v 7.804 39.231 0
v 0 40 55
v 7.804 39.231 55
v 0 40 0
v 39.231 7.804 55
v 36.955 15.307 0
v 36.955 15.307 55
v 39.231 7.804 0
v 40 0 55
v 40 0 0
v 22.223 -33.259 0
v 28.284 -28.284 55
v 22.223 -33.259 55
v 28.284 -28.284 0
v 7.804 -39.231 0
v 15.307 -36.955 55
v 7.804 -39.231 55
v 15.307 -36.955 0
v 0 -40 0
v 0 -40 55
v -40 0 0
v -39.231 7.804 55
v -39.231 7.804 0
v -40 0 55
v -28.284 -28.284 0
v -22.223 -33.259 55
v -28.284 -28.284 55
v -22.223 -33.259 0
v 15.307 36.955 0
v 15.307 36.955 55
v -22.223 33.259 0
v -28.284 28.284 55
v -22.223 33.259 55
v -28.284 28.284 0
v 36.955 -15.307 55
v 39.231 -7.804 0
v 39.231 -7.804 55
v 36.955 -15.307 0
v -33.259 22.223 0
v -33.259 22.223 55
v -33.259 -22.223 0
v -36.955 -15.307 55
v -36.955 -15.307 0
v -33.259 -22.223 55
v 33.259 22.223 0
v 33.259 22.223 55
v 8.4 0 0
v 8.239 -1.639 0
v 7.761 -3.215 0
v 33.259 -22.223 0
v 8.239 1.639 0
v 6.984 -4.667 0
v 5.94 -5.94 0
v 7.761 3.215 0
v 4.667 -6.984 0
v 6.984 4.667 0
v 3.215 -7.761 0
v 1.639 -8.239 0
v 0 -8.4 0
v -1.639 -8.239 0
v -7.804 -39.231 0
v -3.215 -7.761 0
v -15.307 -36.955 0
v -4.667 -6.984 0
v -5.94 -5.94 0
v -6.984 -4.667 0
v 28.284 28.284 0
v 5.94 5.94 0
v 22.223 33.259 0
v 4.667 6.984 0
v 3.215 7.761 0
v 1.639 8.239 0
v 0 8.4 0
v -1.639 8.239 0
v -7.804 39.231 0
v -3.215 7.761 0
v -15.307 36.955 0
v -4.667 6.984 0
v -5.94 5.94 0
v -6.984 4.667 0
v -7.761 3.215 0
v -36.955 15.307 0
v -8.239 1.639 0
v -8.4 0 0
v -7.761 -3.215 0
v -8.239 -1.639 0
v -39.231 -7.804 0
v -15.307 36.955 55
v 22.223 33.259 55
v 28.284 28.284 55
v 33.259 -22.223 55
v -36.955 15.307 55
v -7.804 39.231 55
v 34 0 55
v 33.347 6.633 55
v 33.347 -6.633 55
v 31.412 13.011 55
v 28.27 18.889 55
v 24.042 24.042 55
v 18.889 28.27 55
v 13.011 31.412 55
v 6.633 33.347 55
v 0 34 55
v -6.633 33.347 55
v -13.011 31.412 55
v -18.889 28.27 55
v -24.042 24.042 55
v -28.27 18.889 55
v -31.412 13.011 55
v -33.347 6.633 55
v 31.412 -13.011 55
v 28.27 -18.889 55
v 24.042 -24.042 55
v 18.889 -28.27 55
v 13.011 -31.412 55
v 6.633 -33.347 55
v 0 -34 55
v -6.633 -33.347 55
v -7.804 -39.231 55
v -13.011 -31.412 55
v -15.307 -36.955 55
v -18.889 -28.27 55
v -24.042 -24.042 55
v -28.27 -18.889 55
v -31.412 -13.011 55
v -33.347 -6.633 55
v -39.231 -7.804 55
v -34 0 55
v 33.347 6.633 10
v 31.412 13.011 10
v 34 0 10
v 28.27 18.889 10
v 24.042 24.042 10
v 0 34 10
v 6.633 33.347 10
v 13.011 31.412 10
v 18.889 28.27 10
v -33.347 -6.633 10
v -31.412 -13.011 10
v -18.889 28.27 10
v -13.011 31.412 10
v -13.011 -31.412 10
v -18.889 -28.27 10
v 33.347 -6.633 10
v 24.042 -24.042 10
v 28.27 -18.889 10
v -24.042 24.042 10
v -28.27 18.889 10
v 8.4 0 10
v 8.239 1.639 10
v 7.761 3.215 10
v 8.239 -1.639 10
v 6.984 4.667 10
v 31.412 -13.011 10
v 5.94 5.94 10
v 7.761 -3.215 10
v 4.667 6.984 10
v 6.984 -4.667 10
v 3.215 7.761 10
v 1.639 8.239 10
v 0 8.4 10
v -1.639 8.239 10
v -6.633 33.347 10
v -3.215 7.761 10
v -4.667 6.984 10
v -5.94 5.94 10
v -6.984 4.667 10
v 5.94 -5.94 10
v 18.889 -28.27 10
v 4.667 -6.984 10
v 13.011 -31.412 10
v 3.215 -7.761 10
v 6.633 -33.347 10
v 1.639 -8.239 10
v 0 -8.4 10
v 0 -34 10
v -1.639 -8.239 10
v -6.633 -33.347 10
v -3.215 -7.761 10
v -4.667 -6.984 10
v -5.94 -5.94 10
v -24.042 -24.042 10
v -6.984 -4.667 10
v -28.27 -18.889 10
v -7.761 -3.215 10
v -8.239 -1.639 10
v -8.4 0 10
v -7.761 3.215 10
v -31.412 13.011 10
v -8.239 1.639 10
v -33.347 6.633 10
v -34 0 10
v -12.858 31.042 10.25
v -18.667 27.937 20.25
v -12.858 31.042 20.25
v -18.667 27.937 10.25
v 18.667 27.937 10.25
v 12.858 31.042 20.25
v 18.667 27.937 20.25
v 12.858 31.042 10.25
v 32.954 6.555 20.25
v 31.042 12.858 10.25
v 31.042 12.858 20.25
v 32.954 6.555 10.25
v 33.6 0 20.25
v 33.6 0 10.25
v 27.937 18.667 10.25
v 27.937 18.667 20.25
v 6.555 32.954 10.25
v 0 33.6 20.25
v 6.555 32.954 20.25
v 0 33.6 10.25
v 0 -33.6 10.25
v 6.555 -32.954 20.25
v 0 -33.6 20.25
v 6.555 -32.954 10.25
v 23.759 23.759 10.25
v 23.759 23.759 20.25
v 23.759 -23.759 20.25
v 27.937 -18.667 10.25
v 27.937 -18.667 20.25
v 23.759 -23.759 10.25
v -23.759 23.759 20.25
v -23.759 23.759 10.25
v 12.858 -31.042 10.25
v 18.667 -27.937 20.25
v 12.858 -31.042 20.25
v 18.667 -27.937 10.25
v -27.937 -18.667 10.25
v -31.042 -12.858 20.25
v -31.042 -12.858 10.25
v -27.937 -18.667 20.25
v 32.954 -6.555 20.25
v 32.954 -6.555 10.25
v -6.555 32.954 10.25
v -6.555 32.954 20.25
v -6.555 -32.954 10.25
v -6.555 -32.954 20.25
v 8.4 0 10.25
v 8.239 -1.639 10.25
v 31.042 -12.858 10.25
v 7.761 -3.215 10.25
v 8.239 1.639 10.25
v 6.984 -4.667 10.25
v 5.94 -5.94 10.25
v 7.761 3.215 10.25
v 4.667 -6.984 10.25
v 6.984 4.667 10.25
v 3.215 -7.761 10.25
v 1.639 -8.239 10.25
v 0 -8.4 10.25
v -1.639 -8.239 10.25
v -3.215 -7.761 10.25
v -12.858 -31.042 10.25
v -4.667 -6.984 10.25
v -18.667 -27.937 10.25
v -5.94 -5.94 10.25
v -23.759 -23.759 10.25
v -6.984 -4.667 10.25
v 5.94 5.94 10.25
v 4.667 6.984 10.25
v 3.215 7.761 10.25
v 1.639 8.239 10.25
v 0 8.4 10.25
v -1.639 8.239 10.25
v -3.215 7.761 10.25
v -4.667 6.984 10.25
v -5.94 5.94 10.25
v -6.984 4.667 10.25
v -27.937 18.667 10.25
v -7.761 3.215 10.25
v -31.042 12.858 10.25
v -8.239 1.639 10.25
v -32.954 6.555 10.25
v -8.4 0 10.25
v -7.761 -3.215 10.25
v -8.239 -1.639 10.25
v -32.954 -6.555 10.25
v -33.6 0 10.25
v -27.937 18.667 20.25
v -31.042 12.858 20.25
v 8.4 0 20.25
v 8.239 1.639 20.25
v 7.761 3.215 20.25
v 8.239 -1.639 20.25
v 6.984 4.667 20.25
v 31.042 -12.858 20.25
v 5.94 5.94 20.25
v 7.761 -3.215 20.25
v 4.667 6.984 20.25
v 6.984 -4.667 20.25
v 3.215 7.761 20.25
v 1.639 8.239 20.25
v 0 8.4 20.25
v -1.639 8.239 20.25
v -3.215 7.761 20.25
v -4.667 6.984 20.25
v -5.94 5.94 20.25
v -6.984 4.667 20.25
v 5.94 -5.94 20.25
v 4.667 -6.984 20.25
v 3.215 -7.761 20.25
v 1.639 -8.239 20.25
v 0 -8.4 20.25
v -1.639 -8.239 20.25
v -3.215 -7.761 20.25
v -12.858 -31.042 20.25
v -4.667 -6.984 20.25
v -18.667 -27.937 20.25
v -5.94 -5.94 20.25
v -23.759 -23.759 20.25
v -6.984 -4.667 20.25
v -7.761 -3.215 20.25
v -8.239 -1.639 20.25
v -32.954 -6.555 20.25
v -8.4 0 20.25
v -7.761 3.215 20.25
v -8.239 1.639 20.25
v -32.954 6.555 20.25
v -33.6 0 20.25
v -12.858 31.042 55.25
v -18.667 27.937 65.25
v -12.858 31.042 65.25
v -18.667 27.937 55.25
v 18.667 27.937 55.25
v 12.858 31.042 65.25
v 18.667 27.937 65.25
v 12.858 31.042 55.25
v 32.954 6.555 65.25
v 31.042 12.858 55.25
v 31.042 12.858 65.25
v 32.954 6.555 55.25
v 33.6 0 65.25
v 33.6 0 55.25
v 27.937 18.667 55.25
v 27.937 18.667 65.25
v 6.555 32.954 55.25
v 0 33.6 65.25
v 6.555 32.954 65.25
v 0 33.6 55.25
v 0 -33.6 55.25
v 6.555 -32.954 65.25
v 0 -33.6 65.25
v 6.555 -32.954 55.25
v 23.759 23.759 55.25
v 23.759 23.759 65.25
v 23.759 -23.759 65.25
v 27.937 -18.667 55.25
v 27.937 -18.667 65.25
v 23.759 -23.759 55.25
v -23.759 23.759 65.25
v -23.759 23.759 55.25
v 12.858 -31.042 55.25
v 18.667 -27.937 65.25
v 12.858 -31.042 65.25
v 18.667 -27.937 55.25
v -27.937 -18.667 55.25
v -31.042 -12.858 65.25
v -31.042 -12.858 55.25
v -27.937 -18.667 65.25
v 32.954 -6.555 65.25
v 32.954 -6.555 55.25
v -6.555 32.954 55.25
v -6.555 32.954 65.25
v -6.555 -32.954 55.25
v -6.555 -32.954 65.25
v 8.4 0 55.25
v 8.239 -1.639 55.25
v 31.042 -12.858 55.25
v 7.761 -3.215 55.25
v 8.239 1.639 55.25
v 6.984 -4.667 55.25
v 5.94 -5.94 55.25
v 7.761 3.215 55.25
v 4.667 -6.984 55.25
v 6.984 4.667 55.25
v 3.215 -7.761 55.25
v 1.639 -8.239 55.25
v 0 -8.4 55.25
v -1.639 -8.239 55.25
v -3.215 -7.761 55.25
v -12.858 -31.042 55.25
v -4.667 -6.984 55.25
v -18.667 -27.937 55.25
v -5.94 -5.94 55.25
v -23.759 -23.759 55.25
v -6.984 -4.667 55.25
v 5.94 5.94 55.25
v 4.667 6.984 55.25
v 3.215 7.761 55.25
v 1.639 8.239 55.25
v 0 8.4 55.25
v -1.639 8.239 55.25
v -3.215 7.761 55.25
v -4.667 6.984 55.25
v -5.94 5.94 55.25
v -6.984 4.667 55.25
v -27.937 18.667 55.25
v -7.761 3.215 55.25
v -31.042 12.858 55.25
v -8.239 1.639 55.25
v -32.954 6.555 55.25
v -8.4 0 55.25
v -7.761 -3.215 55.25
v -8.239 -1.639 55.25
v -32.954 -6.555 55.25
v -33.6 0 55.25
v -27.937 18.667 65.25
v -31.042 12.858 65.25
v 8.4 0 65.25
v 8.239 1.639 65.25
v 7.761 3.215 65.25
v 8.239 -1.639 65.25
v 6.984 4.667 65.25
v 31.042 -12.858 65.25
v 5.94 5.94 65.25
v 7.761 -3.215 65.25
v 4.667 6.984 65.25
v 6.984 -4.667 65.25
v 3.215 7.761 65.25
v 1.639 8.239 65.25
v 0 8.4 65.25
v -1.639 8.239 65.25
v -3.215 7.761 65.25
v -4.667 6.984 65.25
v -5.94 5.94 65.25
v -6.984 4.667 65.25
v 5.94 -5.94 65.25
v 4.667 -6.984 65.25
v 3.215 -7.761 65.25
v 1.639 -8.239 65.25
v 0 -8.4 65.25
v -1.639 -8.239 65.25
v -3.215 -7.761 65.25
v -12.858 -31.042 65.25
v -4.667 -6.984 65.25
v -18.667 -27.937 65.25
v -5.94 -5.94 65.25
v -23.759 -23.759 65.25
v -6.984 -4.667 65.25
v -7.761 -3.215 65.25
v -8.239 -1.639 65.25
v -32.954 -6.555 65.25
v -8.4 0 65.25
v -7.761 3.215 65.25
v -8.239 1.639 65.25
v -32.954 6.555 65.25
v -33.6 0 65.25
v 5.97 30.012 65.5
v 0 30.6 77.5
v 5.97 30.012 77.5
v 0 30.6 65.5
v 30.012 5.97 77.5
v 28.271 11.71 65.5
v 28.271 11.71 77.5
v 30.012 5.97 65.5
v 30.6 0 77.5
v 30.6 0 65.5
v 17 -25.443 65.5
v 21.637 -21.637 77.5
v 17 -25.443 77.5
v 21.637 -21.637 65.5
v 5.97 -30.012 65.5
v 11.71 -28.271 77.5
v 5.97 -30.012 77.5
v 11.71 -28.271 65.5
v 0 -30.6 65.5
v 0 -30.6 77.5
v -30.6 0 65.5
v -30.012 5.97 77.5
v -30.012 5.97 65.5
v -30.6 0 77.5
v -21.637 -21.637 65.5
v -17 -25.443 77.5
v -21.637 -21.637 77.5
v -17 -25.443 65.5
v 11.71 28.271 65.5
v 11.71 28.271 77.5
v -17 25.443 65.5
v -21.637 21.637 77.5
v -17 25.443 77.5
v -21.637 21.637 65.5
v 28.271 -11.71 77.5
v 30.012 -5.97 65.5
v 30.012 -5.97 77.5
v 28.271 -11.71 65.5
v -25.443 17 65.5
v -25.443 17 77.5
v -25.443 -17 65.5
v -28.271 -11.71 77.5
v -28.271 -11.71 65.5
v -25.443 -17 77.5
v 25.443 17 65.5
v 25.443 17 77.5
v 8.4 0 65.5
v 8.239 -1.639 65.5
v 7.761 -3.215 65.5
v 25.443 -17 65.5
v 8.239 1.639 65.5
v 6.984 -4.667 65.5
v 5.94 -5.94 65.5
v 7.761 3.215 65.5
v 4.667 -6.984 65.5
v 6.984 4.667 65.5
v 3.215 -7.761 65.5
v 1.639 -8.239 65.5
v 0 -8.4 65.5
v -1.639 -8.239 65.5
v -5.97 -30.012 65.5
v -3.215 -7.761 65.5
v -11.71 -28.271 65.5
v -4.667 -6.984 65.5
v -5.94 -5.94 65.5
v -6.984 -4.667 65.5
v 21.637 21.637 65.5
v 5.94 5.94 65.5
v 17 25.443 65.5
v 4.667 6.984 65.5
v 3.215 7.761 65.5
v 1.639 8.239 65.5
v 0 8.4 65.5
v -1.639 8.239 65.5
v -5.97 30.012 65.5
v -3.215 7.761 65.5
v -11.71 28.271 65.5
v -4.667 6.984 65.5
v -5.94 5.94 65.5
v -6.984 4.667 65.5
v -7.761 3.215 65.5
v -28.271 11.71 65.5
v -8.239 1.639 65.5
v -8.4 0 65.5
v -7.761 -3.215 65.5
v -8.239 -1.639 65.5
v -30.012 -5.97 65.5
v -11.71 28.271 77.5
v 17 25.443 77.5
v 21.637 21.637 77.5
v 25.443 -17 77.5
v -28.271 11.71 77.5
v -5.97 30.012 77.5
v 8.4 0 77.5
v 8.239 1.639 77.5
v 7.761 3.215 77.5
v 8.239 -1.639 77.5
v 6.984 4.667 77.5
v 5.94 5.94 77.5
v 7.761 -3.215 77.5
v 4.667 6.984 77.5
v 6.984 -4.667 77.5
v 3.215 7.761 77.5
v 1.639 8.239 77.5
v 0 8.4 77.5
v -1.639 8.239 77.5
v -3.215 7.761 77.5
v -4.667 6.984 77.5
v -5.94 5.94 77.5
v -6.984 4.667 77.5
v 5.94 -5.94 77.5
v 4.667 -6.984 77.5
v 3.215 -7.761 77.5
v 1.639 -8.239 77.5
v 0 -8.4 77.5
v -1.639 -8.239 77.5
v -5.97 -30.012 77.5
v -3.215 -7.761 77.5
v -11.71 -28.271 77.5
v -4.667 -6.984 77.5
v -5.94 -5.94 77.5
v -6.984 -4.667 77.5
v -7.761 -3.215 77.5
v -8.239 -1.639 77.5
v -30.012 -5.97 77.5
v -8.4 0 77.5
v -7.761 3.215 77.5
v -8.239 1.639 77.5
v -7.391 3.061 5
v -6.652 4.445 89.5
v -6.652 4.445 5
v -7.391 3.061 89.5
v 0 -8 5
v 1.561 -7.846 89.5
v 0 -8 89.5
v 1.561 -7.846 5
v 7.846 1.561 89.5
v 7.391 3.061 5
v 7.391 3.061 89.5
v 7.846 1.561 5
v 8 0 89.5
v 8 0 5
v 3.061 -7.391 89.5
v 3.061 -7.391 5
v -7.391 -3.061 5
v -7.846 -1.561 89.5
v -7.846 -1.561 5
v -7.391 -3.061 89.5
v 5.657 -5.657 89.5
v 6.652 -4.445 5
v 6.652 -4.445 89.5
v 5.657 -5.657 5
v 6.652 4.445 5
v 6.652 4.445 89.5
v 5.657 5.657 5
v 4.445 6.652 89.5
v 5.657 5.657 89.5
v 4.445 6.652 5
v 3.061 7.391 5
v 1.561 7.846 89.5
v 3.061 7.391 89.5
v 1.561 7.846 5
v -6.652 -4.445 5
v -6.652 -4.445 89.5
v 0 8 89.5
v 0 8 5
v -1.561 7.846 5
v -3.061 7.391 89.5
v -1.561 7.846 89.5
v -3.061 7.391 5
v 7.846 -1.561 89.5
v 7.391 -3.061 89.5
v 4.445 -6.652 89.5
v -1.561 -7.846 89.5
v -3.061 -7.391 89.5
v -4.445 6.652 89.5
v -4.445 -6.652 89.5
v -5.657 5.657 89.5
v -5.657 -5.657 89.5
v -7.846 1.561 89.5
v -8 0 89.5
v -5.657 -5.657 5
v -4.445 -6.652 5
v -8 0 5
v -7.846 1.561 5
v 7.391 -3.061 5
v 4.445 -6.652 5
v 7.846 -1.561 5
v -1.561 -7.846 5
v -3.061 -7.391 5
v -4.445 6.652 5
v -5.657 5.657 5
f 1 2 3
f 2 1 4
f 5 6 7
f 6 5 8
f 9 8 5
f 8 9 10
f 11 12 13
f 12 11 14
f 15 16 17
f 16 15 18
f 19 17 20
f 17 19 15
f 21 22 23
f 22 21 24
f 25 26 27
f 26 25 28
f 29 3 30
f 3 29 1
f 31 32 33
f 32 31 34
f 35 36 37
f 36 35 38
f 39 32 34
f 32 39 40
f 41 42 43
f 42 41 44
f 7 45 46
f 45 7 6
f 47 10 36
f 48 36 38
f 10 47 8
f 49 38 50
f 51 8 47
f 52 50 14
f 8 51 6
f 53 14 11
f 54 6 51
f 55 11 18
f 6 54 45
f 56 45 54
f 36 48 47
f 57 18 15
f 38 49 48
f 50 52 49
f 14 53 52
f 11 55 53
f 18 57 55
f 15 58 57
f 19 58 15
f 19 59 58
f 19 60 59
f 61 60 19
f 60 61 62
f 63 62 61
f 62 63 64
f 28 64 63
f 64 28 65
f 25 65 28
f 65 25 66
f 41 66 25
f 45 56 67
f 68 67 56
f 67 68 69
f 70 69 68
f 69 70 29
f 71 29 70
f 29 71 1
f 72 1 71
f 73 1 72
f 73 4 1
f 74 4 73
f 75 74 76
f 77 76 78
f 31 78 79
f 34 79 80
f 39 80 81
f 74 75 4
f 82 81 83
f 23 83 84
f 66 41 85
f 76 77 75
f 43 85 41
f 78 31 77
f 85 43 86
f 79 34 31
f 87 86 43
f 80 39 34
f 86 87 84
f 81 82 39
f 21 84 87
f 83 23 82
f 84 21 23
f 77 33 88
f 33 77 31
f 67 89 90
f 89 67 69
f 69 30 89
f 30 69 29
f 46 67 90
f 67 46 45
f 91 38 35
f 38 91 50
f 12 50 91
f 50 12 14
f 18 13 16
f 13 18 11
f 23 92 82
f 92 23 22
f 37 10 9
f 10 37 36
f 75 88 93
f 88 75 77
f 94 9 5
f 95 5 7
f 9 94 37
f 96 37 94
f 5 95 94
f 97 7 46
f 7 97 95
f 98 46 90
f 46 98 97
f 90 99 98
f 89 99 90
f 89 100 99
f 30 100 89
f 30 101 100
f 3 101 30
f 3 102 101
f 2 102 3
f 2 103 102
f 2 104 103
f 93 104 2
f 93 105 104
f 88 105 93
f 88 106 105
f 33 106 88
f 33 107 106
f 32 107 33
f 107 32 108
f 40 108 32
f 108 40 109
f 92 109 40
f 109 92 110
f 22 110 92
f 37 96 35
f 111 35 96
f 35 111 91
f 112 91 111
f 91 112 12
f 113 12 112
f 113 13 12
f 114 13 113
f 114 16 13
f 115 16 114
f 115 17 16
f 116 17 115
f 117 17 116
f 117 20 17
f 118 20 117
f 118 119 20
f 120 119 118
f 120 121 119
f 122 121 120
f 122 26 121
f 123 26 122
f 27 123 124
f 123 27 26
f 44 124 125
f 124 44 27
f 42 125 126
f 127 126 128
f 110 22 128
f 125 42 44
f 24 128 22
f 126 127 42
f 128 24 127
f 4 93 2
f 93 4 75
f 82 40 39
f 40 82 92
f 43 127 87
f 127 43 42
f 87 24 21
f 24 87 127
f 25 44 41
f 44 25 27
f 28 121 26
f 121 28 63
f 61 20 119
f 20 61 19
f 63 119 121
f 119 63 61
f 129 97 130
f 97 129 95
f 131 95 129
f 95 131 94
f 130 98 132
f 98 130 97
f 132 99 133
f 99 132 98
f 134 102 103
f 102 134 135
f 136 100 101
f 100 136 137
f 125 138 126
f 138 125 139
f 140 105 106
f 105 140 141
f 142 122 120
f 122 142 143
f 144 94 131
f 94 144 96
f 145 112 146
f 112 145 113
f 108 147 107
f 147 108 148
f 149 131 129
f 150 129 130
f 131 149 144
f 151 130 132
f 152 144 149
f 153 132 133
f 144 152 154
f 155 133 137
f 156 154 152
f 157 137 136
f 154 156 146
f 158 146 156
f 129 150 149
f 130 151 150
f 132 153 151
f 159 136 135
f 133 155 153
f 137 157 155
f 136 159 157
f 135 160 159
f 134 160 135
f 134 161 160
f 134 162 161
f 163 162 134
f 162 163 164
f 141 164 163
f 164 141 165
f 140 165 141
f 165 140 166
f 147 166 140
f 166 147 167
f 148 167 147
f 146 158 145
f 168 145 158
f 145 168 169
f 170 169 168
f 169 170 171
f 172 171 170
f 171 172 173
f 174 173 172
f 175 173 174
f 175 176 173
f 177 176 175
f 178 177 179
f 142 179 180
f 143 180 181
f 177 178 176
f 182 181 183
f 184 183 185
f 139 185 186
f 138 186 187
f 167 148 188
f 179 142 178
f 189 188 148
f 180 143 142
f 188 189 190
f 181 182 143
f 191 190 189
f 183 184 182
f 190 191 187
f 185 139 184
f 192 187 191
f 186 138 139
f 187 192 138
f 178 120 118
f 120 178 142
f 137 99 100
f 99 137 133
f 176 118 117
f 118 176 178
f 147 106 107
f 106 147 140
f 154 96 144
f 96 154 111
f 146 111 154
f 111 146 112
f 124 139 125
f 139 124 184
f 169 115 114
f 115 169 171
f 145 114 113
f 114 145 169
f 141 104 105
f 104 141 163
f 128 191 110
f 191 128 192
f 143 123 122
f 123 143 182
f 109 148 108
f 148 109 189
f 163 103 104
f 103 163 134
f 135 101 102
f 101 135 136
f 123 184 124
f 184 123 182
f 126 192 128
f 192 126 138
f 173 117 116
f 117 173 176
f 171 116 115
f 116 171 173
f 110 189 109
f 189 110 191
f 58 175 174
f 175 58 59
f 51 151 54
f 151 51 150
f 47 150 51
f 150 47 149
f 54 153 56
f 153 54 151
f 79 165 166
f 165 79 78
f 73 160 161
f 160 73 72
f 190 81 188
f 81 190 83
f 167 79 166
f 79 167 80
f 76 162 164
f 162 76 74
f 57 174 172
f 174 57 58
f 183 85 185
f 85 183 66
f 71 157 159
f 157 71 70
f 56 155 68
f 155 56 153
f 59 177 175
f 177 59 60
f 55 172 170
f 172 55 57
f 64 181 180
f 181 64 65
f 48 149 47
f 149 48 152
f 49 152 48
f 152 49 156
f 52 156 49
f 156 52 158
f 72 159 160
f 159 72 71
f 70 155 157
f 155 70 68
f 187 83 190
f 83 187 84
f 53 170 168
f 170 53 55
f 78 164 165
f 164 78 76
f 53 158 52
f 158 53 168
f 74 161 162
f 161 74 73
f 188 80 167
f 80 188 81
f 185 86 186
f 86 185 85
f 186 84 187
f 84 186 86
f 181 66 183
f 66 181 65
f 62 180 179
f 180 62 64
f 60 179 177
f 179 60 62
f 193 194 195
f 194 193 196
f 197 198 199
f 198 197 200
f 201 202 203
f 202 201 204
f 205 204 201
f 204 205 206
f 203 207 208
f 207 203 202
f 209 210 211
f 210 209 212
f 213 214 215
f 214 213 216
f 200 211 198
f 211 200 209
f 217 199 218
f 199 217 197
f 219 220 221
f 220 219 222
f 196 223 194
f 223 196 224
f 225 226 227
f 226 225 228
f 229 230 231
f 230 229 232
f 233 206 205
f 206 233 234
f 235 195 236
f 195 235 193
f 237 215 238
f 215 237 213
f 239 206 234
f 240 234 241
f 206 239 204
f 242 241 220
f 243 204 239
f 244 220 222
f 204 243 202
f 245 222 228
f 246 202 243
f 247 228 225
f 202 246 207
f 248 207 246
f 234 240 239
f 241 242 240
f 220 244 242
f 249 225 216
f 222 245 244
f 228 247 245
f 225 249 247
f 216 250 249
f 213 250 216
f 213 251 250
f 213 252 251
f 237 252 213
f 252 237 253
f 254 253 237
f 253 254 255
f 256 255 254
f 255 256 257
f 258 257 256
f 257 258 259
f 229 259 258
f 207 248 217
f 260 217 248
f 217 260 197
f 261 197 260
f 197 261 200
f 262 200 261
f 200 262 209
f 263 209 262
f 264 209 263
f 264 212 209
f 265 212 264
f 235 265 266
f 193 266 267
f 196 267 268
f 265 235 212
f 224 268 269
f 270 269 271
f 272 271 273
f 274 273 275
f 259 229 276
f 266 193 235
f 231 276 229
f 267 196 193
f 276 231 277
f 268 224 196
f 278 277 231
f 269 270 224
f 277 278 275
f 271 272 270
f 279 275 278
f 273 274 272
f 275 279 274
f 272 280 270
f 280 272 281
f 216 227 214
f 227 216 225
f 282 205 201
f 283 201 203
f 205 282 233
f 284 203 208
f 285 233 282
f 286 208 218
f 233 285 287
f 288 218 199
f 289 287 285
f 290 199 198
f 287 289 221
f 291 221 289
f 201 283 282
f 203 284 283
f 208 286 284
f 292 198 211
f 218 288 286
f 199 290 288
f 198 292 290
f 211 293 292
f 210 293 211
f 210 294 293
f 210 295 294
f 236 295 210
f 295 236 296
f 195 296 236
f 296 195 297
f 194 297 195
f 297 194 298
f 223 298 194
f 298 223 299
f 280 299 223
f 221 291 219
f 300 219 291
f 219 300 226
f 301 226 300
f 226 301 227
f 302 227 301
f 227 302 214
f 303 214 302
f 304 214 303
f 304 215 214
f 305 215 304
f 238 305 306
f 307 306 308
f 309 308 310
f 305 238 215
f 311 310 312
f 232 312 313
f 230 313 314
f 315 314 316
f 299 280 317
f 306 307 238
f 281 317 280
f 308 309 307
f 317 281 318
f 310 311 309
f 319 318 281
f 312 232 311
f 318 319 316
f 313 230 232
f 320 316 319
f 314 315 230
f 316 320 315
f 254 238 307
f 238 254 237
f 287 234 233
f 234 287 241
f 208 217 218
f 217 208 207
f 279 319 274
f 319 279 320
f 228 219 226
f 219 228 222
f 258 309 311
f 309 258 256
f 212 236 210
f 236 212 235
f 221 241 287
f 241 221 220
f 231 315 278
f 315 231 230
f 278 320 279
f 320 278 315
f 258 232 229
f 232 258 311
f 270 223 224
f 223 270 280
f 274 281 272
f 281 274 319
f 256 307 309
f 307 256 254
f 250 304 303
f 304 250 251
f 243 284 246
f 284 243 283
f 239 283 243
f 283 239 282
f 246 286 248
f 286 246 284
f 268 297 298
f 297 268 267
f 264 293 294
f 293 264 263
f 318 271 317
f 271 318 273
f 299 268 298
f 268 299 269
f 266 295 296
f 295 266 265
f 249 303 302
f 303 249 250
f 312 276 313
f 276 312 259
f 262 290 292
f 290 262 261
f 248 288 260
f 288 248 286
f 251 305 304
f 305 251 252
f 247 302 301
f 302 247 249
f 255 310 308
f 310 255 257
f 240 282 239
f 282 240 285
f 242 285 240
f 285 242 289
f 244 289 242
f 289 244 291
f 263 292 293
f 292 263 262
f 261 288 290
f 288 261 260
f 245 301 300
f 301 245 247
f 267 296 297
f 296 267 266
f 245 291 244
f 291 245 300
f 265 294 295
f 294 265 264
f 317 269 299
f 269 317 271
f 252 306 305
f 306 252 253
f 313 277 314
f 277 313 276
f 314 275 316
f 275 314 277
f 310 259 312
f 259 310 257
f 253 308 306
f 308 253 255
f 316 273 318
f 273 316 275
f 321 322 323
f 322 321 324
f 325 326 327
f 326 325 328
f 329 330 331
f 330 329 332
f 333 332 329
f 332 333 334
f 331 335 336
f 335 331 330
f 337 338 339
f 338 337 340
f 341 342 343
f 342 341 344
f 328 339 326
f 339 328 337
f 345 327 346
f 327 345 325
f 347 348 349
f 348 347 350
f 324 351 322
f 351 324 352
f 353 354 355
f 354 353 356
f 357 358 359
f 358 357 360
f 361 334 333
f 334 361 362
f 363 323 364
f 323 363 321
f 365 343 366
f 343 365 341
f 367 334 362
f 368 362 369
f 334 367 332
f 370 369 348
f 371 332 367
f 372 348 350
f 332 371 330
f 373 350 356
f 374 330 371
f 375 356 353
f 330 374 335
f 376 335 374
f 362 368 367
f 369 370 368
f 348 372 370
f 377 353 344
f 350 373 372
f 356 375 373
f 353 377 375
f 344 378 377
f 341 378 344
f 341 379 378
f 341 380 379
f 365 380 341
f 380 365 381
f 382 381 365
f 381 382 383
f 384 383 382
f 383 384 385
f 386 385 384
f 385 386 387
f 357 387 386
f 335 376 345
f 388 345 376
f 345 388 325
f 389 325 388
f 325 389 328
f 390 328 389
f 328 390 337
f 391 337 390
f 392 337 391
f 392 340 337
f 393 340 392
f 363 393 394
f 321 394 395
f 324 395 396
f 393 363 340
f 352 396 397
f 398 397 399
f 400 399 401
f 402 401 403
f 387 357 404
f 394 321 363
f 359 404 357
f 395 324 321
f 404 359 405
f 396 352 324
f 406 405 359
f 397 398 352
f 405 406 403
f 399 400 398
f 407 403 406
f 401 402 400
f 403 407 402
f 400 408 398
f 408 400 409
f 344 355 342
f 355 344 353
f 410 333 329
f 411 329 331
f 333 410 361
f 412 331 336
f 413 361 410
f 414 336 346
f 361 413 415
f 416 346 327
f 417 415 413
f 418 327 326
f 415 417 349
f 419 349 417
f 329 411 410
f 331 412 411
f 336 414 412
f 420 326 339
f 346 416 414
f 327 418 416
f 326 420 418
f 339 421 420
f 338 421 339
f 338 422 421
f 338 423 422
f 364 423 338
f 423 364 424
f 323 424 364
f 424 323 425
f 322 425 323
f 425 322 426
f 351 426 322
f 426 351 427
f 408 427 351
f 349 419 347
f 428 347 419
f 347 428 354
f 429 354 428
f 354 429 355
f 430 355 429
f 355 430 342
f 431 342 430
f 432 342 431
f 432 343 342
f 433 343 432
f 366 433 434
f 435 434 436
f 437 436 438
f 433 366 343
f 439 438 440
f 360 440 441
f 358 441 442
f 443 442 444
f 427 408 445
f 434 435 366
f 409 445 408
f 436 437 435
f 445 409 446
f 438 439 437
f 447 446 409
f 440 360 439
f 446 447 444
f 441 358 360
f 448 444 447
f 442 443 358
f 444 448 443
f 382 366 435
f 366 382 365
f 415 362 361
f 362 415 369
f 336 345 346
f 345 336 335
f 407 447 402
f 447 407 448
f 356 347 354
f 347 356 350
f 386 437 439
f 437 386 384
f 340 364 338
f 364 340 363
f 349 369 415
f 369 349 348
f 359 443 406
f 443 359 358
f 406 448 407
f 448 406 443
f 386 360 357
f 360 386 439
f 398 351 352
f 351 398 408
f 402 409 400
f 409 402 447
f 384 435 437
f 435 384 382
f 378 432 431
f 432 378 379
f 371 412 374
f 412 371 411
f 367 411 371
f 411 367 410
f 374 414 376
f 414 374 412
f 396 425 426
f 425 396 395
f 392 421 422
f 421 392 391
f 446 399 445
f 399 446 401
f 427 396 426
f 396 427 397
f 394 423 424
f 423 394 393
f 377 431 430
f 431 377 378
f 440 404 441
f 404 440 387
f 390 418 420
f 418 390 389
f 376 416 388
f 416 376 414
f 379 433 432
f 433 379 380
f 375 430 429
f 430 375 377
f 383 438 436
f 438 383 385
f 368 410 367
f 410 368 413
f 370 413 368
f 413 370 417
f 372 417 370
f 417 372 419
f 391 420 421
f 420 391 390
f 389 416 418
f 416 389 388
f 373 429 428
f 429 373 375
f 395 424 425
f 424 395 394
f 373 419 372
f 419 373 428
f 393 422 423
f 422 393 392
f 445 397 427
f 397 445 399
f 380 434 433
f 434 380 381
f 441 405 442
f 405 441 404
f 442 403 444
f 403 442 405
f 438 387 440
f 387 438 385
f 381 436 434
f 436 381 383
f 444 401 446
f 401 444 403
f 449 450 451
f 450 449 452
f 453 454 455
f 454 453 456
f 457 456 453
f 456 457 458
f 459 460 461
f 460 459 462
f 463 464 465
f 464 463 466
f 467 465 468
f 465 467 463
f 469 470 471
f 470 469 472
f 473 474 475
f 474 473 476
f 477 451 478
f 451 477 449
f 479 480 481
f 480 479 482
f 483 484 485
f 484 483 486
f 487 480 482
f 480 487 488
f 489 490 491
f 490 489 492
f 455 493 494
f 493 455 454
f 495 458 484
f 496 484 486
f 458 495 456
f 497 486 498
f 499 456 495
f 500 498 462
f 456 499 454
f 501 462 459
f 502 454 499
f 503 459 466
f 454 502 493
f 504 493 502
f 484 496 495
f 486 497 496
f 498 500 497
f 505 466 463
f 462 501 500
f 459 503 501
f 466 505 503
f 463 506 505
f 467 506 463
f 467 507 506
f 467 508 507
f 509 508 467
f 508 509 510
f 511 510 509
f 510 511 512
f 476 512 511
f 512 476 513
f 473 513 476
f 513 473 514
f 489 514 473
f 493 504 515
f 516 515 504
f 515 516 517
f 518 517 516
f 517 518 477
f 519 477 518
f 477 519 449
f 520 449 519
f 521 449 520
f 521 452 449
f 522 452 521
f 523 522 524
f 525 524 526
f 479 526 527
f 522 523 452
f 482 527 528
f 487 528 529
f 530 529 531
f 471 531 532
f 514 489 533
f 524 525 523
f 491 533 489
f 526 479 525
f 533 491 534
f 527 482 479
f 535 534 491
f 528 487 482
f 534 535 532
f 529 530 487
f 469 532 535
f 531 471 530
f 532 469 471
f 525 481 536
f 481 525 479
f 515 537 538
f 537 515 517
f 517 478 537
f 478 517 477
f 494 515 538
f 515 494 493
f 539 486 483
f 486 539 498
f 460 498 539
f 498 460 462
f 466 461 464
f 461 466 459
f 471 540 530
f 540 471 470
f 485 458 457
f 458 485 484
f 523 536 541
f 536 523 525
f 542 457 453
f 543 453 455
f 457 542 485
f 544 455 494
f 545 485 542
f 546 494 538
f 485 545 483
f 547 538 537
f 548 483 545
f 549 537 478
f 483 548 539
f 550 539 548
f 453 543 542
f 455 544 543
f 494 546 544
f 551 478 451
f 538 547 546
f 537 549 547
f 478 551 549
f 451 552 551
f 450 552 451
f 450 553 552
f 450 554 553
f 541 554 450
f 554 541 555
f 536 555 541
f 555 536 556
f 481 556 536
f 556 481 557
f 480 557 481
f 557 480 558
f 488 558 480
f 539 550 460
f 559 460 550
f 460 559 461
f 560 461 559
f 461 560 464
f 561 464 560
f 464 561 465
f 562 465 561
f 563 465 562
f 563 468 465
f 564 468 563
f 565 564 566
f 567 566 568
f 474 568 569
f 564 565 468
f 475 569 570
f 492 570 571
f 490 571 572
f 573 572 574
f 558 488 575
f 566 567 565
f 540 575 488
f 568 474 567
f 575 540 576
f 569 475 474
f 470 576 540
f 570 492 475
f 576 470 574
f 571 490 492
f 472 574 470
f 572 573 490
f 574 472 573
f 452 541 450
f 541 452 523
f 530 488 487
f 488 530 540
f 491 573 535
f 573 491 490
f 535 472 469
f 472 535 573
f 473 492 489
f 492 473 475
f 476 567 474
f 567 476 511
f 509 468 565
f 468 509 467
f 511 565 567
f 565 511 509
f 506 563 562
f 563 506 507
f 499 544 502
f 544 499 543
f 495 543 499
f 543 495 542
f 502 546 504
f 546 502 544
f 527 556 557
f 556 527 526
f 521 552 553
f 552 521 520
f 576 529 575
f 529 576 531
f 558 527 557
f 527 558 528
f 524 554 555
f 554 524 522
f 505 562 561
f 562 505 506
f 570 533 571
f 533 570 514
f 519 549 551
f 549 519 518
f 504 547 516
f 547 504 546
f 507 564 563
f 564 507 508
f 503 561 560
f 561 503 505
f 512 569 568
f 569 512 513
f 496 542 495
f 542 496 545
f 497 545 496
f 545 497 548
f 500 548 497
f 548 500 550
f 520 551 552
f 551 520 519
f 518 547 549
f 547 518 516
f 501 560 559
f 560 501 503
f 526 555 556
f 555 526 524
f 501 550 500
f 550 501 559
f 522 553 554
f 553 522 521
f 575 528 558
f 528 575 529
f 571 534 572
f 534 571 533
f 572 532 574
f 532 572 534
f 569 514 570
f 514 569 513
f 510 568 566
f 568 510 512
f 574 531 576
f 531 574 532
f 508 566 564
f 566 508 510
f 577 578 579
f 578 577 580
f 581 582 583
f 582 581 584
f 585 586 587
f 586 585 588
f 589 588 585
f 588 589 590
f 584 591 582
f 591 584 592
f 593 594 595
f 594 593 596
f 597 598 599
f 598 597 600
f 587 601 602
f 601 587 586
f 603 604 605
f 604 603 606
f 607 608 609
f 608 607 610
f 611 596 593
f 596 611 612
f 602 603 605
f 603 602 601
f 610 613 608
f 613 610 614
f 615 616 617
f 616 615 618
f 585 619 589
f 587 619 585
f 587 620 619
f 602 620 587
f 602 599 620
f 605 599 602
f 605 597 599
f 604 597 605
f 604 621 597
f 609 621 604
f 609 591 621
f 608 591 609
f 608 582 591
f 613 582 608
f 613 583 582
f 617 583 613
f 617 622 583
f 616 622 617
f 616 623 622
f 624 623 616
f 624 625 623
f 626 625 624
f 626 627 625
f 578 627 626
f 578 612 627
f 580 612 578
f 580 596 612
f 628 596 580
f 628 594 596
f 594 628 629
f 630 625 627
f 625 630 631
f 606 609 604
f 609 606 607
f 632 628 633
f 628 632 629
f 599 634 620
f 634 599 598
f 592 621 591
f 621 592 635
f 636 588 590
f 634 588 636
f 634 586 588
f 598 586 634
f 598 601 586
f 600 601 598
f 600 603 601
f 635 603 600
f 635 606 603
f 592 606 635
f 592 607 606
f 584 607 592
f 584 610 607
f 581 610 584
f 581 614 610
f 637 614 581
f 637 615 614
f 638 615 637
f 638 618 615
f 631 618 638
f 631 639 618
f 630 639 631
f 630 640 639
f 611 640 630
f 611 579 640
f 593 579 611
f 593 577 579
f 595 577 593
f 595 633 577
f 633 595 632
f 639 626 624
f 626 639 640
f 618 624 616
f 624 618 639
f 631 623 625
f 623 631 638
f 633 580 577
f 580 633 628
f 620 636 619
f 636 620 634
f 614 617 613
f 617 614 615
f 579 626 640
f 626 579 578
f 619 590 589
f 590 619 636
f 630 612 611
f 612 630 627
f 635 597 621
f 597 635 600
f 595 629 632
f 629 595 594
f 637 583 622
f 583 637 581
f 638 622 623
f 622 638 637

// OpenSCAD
$fn = 32;

// ------------------------------------------------------------------------
// Bearing housing: housing d80, two bearings and a shaft
// Every part is its own module, assembly() places them once.
// ------------------------------------------------------------------------

// --- part 1 ---
module housing() {
  difference() {
    cylinder(h = 55, d = 80);
    translate([0, 0, 10]) cylinder(h = 46, d = 68);
    translate([0, 0, -1]) cylinder(h = 12, d = 16.8);
  }
}

// --- part 2 ---
module bearing_lower() {
  difference() {
      translate([0, 0, 0]) cylinder(h = 10, d = 67.2);
      translate([0, 0, -1]) cylinder(h = 12, d = 16.8);
    }
}

// --- part 3 ---
module bearing_upper() {
  difference() {
      translate([0, 0, 0]) cylinder(h = 10, d = 67.2);
      translate([0, 0, -1]) cylinder(h = 12, d = 16.8);
    }
}

// --- part 4 ---
module spacer() {
  difference() {
      translate([0, 0, 0]) cylinder(h = 12, d = 61.2);
      translate([0, 0, -1]) cylinder(h = 14, d = 16.8);
    }
}

// --- part 5 ---
module shaft() {
  translate([0, 0, -42.25]) cylinder(h = 84.5, d = 16);
}

// --- assembly ---
module assembly() {
  translate([0, 0, 0]) rotate([0, 0, 0]) housing();
  translate([0, 0, 10.25]) rotate([0, 0, 0]) bearing_lower();
  translate([0, 0, 55.25]) rotate([0, 0, 0]) bearing_upper();
  translate([0, 0, 65.5]) rotate([0, 0, 0]) spacer();
  translate([0, 0, 47.25]) rotate([0, 0, 0]) shaft();
}

assembly();
